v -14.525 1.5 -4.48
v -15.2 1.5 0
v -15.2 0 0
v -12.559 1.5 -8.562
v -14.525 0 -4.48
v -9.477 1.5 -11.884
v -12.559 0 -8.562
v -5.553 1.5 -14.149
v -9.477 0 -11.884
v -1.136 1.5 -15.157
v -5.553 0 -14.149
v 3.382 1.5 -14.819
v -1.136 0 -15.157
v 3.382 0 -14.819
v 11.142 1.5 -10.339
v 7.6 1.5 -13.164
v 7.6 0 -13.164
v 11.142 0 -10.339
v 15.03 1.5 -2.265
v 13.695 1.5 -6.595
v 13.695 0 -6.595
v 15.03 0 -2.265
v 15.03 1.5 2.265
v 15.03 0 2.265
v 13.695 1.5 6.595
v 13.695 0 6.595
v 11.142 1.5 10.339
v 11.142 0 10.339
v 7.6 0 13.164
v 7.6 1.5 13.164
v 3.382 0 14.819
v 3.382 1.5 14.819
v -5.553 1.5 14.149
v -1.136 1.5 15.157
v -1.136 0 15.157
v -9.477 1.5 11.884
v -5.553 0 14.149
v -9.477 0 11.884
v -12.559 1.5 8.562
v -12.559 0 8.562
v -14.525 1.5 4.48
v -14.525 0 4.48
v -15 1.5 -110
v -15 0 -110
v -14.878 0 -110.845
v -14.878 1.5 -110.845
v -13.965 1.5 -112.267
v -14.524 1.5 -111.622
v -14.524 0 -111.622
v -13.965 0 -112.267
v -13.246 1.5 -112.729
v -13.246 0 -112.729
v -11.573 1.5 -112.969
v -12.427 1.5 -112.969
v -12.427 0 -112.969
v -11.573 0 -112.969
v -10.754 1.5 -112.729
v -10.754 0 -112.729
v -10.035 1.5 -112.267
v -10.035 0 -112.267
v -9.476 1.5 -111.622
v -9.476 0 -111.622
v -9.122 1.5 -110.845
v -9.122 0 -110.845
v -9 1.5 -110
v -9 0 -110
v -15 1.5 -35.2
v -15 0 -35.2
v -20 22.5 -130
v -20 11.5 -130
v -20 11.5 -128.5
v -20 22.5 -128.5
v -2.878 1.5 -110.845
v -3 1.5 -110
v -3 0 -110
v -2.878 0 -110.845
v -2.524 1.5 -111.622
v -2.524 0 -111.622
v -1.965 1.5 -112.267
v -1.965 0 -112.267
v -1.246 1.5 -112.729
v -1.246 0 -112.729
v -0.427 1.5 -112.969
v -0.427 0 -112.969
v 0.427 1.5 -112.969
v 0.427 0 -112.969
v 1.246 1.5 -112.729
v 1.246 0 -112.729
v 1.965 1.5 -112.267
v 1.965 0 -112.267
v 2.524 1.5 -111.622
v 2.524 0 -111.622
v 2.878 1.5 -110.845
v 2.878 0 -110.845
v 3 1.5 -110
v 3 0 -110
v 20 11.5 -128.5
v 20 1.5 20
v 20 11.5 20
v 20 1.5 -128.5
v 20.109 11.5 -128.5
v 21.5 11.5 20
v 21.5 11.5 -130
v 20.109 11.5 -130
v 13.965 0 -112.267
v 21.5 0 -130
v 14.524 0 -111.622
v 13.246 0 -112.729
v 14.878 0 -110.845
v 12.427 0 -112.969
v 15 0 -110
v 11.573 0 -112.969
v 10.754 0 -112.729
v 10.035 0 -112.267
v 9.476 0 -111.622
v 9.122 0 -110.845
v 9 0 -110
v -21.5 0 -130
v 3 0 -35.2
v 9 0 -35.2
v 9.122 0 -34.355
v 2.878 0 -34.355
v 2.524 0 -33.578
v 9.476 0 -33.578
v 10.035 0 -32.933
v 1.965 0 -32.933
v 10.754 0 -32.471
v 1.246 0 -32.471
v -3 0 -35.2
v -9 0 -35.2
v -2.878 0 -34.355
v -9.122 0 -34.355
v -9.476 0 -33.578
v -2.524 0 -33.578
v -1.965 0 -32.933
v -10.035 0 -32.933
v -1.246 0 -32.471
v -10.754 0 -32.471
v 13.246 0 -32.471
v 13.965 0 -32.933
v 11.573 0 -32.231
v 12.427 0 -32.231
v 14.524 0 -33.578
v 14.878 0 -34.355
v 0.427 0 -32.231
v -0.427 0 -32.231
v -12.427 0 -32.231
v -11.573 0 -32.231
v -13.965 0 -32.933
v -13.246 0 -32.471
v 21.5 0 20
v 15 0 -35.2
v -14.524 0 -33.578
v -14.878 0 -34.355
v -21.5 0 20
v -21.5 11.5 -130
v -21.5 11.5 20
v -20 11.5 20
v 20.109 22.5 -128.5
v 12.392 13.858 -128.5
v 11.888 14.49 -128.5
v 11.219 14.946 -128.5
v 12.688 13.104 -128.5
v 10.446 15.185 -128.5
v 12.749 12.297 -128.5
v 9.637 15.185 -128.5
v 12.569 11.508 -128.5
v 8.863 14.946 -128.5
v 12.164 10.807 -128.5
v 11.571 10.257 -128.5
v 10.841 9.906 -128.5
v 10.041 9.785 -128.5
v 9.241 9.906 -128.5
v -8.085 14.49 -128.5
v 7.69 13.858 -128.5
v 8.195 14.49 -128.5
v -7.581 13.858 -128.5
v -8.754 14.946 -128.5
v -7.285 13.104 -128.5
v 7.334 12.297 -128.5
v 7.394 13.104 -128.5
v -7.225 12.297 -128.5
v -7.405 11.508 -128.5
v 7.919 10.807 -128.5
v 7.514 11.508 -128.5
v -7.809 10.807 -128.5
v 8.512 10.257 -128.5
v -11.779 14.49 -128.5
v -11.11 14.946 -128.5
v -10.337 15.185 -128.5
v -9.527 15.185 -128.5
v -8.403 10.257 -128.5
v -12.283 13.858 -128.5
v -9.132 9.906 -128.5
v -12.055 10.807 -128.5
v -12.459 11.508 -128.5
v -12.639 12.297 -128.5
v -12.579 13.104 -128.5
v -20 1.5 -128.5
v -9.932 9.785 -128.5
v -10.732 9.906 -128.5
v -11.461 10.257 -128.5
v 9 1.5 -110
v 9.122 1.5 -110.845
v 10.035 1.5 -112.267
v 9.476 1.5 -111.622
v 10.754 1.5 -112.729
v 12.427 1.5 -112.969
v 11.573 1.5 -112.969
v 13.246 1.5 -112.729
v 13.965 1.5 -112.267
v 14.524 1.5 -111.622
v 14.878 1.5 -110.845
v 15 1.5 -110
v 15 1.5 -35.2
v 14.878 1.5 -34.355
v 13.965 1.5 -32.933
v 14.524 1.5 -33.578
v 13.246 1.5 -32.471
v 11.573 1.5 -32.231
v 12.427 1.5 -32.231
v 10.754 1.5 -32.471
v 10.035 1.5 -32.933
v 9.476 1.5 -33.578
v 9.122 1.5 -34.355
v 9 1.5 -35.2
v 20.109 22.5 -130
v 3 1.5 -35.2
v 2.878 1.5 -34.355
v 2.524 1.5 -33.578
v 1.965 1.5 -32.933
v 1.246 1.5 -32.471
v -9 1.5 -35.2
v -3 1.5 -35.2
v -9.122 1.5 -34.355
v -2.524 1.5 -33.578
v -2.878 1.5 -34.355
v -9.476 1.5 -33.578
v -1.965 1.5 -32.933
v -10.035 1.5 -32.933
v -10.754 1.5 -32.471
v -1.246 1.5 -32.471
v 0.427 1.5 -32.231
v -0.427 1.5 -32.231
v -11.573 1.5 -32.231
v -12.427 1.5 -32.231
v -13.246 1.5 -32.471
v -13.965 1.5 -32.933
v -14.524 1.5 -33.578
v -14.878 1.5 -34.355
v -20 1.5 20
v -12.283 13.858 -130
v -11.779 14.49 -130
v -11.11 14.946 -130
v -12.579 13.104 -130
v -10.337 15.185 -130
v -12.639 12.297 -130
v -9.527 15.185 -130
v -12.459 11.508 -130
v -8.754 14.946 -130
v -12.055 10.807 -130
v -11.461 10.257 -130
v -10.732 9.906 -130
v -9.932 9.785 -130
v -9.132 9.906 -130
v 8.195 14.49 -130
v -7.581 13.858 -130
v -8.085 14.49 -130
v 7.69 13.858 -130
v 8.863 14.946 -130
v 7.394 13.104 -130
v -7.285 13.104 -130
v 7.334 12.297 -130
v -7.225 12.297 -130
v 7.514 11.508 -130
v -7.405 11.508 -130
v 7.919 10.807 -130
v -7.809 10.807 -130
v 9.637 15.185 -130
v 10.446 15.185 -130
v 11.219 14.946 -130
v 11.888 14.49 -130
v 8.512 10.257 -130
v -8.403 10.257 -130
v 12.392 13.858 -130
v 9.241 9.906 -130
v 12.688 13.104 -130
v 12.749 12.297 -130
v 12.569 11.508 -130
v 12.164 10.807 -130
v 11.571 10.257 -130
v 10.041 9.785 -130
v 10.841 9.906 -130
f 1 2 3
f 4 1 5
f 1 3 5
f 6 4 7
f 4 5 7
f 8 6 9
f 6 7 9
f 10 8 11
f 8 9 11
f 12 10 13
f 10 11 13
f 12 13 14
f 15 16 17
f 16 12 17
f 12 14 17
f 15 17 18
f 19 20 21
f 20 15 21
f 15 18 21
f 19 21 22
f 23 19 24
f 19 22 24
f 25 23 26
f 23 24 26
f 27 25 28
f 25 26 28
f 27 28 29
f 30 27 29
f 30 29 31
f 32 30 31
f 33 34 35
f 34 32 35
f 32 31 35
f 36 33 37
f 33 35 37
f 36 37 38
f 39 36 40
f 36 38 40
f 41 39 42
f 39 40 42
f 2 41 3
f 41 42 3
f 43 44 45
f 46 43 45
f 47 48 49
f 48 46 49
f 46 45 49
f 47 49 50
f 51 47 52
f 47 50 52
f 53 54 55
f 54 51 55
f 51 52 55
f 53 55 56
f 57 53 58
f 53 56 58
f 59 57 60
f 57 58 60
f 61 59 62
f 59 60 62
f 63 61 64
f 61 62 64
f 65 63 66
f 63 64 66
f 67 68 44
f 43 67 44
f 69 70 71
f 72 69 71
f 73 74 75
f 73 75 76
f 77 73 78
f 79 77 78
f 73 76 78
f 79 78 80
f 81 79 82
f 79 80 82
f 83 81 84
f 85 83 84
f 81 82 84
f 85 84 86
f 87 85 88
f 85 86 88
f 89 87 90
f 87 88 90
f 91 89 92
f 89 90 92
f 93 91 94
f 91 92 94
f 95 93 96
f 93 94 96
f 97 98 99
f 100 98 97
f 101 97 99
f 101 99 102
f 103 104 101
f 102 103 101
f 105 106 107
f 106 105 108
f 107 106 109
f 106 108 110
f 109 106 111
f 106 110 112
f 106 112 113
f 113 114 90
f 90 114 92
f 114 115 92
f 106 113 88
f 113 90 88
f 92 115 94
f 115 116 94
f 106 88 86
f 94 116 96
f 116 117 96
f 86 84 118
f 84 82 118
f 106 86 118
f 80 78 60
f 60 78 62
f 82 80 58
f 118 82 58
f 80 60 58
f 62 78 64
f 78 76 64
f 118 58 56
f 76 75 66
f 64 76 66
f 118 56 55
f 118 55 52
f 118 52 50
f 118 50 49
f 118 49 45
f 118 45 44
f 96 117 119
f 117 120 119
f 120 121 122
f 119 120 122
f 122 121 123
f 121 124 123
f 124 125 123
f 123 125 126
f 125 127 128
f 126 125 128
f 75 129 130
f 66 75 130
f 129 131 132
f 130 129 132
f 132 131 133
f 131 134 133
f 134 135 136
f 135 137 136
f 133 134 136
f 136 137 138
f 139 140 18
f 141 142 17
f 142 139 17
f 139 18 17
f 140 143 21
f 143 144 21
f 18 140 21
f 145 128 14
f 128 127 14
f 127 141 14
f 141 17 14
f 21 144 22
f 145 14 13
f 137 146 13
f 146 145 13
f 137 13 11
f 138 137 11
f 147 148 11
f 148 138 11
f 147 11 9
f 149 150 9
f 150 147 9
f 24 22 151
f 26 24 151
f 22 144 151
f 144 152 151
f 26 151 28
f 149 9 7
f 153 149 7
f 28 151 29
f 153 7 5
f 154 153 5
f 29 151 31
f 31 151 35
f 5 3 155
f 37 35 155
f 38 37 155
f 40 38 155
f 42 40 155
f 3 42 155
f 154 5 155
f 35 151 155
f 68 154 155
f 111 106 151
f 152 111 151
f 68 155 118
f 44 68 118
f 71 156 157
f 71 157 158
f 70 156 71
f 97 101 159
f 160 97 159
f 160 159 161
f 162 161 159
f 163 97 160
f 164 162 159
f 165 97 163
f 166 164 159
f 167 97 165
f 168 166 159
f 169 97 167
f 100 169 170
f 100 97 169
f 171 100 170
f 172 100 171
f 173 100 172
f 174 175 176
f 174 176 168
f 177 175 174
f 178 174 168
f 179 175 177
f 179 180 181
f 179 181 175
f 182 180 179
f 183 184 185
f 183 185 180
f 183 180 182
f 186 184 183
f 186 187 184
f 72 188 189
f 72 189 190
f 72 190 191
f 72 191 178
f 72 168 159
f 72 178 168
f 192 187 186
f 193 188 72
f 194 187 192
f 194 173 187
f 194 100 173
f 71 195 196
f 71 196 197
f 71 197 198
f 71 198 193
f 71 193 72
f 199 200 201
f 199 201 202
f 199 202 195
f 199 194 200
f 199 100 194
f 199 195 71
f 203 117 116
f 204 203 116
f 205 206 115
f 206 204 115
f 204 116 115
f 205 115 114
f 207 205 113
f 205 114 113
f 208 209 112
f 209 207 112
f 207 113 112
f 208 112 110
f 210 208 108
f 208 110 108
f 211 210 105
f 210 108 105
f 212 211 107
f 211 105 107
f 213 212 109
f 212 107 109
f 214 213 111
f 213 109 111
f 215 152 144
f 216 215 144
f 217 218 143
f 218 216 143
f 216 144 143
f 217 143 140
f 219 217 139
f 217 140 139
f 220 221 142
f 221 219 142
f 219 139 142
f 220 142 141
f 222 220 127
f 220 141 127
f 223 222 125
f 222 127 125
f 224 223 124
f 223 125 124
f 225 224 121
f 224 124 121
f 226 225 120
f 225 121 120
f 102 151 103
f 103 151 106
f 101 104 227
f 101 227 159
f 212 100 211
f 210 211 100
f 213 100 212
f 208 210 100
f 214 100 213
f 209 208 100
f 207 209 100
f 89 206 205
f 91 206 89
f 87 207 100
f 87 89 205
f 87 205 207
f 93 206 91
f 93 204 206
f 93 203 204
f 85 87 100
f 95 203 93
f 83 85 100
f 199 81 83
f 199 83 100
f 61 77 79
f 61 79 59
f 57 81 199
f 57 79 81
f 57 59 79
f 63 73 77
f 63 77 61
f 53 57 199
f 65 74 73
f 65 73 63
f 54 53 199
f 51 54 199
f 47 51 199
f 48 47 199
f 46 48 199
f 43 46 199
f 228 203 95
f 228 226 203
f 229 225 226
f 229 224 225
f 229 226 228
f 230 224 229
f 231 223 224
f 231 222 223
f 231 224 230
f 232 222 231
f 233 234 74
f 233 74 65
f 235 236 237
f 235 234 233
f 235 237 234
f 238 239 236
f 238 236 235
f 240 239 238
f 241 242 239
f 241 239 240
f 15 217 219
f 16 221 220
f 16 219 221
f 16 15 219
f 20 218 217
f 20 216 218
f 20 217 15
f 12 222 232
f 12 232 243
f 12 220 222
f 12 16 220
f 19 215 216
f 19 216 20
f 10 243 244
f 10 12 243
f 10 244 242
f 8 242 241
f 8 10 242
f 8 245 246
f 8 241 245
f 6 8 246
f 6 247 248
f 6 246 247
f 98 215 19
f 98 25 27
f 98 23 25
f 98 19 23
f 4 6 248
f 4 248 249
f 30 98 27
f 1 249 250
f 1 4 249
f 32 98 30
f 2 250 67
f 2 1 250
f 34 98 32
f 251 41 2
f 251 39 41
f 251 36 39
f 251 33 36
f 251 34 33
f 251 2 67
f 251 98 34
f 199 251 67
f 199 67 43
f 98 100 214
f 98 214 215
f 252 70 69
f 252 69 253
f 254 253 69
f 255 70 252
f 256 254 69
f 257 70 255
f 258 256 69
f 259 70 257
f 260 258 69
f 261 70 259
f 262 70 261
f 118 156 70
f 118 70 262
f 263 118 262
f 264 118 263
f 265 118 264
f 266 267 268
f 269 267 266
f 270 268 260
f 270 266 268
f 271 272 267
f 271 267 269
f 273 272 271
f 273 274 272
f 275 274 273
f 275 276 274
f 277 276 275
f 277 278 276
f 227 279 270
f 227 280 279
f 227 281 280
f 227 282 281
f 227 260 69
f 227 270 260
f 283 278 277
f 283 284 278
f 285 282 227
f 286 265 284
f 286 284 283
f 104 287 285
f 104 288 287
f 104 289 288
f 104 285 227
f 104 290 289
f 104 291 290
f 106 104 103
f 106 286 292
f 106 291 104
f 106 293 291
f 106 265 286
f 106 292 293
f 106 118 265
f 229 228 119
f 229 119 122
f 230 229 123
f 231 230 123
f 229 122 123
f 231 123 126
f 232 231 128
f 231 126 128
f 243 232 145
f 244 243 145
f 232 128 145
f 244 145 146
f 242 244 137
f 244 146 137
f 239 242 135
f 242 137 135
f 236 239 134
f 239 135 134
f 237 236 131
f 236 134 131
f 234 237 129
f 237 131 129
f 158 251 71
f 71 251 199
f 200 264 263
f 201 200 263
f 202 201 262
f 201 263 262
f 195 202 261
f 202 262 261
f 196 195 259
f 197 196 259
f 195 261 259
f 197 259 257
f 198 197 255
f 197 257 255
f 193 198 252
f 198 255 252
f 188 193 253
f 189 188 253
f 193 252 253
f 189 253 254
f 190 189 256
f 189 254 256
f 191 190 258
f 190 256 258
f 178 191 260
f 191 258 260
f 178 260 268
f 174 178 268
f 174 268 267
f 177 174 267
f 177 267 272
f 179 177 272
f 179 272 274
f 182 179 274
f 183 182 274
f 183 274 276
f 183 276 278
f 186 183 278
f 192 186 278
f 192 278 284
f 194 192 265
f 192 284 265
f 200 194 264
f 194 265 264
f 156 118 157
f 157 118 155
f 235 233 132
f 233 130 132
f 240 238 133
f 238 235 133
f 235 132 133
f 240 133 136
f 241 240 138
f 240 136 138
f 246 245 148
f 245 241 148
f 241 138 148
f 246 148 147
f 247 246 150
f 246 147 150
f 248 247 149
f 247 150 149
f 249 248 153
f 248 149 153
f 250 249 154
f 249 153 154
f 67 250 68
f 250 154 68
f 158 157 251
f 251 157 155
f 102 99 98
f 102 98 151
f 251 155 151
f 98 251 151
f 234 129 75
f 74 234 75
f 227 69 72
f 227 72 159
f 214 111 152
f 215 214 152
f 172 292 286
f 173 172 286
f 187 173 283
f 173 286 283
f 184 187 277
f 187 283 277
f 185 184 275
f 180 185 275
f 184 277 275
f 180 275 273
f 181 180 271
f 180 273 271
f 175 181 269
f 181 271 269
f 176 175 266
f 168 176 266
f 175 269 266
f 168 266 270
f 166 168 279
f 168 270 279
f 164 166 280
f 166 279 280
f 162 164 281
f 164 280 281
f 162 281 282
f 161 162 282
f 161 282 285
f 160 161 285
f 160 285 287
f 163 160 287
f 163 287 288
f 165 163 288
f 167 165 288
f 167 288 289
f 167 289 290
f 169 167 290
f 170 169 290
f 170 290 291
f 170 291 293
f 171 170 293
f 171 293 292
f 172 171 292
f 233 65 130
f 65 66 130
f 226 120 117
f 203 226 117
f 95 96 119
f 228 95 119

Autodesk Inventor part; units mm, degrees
ref_plane "YZ Plane" through (0, 0, 0) normal (1, 0, 0) x (0, 1, 0)
ref_plane "XZ Plane" through (0, 0, 0) normal (0, 1, 0) x (-1, 0, 0)
ref_plane "XY Plane" through (0, 0, 0) normal (0, 0, 1) x (1, 0, 0)
sketch "Sketch1" plane through (0, 0, 0) normal (0, 1, 0) x (-1, 0, 0)
  circle A0 centre (0, 0) radius 15.2
  line L0 (21.5, 20) -> (-21.5, 20)
  line L1 (-21.5, 20) -> (-21.5, -130)
  line L2 (-21.5, -130) -> (21.5, -130)
  line L3 (21.5, -130) -> (21.5, 20)
  line L4 (0, -160) -> (0, 50) projected
  line L5 (12, -35.2) -> (12, -110) construction
  line L6 (15, -35.2) -> (15, -110)
  line L7 (9, -110) -> (9, -35.2)
  arc A1 (15, -35.2) -> (9, -35.2) centre (12, -35.2) ccw
  arc A2 (9, -110) -> (15, -110) centre (12, -110) ccw
  line L8 (0, -35.2) -> (0, -110) construction
  line L9 (3, -35.2) -> (3, -110)
  line L10 (-3, -110) -> (-3, -35.2)
  arc A3 (3, -35.2) -> (-3, -35.2) centre (0, -35.2) ccw
  arc A4 (-3, -110) -> (3, -110) centre (0, -110) ccw
  line L11 (-12, -35.2) -> (-12, -110) construction
  line L12 (-9, -35.2) -> (-9, -110)
  line L13 (-15, -110) -> (-15, -35.2)
  arc A5 (-9, -35.2) -> (-15, -35.2) centre (-12, -35.2) ccw
  arc A6 (-15, -110) -> (-9, -110) centre (-12, -110) ccw
  line L14 (12, -72.6) -> (-12, -72.6) construction
  point P0 (0, 20)
  point P1 (0, -72.6)
  dimension "d0" = 30.4
  dimension "d1" = 43
  dimension "d2" = 150
  dimension "d3" = 20
  dimension "d4" = 74.8
  dimension "d5" = 6
  dimension "d6" = 20
  dimension "d7" = 74.8
  dimension "d8" = 6
  dimension "d9" = 74.8
  dimension "d10" = 6
  dimension "d11" = 24
extrude "Extrusion1" add sketch "Sketch1" along normal blind 1.5 contours A0 L4 L0 L3 L2 A4 L9 A3 | A0 L4 A3 L10 A4 L2 L1 L0
sketch "Sketch2" plane through (0, 1.5, 0) normal (0, 1, 0) x (1, 0, 0)
  line L0 (-21.5, 130) -> (-21.5, -20) projected
  line L1 (-21.5, -20) -> (-20, -20)
  line L2 (-20, -20) -> (-20, 130)
  line L3 (-20, 130) -> (-21.5, 130)
  line L4 (-21.5, 130) -> (-21.5, -20)
  line L5 (-21.5, -20) -> (21.5, -20) projected
  line L6 (21.5, 130) -> (-21.5, 130) projected
  line L7 (21.5, -20) -> (20, -20)
  line L8 (20, -20) -> (20, 130)
  line L9 (20, 130) -> (21.5, 130)
  line L10 (21.5, 130) -> (21.5, -20)
  point P0 (0, 0)
  dimension "d14" = 1.5
  dimension "d15" = 1.5
extrude "Extrusion2" add sketch "Sketch2" along normal blind 10 contours L3 L2 L1 L0 | L6 L10 L5 L8
sketch "Sketch3" plane through (0, 1.5, 0) normal (0, 1, 0) x (1, 0, 0)
  line L0 (-20, 130) -> (-20, -20) projected
  line L1 (-20, 130) -> (20.1092, 130)
  line L2 (20.1092, 130) -> (20.1092, 128.5)
  line L3 (20.1092, 128.5) -> (-20, 128.5)
  line L4 (-20, 128.5) -> (-20, 130)
  point P0 (0, 0)
  point P1 (-20, 128.5)
  dimension "d18" = 1.5
extrude "Extrusion3" add sketch "Sketch3" along normal blind 21
sketch "Sketch4" plane through (-20, 1.5, -128.5) normal (0, 0, 1) x (1, 0, 0)
  line L0 (40, 0) -> (0, 0) projected
  line L1 (0, 21) -> (40.1092, 21) construction
  point P0 (20, -1.5)
  point P1 (10.068, 11)
  point P2 (30.0412, 11)
  point P3 (20.0546, 11.517)
  point P4 (20.0546, 21)
  dimension "d21" = 11
  dimension "d23" = 10
  dimension "d24" = 10
hole "Hole1" at (-9.932, 12.5, -128.5) at (10.0412, 12.5, -128.5) direction (0, 0, -1) diameter 5.43 end through all
properties part number "Support Frame (Filament Holder" material "Steel, Wrought"
